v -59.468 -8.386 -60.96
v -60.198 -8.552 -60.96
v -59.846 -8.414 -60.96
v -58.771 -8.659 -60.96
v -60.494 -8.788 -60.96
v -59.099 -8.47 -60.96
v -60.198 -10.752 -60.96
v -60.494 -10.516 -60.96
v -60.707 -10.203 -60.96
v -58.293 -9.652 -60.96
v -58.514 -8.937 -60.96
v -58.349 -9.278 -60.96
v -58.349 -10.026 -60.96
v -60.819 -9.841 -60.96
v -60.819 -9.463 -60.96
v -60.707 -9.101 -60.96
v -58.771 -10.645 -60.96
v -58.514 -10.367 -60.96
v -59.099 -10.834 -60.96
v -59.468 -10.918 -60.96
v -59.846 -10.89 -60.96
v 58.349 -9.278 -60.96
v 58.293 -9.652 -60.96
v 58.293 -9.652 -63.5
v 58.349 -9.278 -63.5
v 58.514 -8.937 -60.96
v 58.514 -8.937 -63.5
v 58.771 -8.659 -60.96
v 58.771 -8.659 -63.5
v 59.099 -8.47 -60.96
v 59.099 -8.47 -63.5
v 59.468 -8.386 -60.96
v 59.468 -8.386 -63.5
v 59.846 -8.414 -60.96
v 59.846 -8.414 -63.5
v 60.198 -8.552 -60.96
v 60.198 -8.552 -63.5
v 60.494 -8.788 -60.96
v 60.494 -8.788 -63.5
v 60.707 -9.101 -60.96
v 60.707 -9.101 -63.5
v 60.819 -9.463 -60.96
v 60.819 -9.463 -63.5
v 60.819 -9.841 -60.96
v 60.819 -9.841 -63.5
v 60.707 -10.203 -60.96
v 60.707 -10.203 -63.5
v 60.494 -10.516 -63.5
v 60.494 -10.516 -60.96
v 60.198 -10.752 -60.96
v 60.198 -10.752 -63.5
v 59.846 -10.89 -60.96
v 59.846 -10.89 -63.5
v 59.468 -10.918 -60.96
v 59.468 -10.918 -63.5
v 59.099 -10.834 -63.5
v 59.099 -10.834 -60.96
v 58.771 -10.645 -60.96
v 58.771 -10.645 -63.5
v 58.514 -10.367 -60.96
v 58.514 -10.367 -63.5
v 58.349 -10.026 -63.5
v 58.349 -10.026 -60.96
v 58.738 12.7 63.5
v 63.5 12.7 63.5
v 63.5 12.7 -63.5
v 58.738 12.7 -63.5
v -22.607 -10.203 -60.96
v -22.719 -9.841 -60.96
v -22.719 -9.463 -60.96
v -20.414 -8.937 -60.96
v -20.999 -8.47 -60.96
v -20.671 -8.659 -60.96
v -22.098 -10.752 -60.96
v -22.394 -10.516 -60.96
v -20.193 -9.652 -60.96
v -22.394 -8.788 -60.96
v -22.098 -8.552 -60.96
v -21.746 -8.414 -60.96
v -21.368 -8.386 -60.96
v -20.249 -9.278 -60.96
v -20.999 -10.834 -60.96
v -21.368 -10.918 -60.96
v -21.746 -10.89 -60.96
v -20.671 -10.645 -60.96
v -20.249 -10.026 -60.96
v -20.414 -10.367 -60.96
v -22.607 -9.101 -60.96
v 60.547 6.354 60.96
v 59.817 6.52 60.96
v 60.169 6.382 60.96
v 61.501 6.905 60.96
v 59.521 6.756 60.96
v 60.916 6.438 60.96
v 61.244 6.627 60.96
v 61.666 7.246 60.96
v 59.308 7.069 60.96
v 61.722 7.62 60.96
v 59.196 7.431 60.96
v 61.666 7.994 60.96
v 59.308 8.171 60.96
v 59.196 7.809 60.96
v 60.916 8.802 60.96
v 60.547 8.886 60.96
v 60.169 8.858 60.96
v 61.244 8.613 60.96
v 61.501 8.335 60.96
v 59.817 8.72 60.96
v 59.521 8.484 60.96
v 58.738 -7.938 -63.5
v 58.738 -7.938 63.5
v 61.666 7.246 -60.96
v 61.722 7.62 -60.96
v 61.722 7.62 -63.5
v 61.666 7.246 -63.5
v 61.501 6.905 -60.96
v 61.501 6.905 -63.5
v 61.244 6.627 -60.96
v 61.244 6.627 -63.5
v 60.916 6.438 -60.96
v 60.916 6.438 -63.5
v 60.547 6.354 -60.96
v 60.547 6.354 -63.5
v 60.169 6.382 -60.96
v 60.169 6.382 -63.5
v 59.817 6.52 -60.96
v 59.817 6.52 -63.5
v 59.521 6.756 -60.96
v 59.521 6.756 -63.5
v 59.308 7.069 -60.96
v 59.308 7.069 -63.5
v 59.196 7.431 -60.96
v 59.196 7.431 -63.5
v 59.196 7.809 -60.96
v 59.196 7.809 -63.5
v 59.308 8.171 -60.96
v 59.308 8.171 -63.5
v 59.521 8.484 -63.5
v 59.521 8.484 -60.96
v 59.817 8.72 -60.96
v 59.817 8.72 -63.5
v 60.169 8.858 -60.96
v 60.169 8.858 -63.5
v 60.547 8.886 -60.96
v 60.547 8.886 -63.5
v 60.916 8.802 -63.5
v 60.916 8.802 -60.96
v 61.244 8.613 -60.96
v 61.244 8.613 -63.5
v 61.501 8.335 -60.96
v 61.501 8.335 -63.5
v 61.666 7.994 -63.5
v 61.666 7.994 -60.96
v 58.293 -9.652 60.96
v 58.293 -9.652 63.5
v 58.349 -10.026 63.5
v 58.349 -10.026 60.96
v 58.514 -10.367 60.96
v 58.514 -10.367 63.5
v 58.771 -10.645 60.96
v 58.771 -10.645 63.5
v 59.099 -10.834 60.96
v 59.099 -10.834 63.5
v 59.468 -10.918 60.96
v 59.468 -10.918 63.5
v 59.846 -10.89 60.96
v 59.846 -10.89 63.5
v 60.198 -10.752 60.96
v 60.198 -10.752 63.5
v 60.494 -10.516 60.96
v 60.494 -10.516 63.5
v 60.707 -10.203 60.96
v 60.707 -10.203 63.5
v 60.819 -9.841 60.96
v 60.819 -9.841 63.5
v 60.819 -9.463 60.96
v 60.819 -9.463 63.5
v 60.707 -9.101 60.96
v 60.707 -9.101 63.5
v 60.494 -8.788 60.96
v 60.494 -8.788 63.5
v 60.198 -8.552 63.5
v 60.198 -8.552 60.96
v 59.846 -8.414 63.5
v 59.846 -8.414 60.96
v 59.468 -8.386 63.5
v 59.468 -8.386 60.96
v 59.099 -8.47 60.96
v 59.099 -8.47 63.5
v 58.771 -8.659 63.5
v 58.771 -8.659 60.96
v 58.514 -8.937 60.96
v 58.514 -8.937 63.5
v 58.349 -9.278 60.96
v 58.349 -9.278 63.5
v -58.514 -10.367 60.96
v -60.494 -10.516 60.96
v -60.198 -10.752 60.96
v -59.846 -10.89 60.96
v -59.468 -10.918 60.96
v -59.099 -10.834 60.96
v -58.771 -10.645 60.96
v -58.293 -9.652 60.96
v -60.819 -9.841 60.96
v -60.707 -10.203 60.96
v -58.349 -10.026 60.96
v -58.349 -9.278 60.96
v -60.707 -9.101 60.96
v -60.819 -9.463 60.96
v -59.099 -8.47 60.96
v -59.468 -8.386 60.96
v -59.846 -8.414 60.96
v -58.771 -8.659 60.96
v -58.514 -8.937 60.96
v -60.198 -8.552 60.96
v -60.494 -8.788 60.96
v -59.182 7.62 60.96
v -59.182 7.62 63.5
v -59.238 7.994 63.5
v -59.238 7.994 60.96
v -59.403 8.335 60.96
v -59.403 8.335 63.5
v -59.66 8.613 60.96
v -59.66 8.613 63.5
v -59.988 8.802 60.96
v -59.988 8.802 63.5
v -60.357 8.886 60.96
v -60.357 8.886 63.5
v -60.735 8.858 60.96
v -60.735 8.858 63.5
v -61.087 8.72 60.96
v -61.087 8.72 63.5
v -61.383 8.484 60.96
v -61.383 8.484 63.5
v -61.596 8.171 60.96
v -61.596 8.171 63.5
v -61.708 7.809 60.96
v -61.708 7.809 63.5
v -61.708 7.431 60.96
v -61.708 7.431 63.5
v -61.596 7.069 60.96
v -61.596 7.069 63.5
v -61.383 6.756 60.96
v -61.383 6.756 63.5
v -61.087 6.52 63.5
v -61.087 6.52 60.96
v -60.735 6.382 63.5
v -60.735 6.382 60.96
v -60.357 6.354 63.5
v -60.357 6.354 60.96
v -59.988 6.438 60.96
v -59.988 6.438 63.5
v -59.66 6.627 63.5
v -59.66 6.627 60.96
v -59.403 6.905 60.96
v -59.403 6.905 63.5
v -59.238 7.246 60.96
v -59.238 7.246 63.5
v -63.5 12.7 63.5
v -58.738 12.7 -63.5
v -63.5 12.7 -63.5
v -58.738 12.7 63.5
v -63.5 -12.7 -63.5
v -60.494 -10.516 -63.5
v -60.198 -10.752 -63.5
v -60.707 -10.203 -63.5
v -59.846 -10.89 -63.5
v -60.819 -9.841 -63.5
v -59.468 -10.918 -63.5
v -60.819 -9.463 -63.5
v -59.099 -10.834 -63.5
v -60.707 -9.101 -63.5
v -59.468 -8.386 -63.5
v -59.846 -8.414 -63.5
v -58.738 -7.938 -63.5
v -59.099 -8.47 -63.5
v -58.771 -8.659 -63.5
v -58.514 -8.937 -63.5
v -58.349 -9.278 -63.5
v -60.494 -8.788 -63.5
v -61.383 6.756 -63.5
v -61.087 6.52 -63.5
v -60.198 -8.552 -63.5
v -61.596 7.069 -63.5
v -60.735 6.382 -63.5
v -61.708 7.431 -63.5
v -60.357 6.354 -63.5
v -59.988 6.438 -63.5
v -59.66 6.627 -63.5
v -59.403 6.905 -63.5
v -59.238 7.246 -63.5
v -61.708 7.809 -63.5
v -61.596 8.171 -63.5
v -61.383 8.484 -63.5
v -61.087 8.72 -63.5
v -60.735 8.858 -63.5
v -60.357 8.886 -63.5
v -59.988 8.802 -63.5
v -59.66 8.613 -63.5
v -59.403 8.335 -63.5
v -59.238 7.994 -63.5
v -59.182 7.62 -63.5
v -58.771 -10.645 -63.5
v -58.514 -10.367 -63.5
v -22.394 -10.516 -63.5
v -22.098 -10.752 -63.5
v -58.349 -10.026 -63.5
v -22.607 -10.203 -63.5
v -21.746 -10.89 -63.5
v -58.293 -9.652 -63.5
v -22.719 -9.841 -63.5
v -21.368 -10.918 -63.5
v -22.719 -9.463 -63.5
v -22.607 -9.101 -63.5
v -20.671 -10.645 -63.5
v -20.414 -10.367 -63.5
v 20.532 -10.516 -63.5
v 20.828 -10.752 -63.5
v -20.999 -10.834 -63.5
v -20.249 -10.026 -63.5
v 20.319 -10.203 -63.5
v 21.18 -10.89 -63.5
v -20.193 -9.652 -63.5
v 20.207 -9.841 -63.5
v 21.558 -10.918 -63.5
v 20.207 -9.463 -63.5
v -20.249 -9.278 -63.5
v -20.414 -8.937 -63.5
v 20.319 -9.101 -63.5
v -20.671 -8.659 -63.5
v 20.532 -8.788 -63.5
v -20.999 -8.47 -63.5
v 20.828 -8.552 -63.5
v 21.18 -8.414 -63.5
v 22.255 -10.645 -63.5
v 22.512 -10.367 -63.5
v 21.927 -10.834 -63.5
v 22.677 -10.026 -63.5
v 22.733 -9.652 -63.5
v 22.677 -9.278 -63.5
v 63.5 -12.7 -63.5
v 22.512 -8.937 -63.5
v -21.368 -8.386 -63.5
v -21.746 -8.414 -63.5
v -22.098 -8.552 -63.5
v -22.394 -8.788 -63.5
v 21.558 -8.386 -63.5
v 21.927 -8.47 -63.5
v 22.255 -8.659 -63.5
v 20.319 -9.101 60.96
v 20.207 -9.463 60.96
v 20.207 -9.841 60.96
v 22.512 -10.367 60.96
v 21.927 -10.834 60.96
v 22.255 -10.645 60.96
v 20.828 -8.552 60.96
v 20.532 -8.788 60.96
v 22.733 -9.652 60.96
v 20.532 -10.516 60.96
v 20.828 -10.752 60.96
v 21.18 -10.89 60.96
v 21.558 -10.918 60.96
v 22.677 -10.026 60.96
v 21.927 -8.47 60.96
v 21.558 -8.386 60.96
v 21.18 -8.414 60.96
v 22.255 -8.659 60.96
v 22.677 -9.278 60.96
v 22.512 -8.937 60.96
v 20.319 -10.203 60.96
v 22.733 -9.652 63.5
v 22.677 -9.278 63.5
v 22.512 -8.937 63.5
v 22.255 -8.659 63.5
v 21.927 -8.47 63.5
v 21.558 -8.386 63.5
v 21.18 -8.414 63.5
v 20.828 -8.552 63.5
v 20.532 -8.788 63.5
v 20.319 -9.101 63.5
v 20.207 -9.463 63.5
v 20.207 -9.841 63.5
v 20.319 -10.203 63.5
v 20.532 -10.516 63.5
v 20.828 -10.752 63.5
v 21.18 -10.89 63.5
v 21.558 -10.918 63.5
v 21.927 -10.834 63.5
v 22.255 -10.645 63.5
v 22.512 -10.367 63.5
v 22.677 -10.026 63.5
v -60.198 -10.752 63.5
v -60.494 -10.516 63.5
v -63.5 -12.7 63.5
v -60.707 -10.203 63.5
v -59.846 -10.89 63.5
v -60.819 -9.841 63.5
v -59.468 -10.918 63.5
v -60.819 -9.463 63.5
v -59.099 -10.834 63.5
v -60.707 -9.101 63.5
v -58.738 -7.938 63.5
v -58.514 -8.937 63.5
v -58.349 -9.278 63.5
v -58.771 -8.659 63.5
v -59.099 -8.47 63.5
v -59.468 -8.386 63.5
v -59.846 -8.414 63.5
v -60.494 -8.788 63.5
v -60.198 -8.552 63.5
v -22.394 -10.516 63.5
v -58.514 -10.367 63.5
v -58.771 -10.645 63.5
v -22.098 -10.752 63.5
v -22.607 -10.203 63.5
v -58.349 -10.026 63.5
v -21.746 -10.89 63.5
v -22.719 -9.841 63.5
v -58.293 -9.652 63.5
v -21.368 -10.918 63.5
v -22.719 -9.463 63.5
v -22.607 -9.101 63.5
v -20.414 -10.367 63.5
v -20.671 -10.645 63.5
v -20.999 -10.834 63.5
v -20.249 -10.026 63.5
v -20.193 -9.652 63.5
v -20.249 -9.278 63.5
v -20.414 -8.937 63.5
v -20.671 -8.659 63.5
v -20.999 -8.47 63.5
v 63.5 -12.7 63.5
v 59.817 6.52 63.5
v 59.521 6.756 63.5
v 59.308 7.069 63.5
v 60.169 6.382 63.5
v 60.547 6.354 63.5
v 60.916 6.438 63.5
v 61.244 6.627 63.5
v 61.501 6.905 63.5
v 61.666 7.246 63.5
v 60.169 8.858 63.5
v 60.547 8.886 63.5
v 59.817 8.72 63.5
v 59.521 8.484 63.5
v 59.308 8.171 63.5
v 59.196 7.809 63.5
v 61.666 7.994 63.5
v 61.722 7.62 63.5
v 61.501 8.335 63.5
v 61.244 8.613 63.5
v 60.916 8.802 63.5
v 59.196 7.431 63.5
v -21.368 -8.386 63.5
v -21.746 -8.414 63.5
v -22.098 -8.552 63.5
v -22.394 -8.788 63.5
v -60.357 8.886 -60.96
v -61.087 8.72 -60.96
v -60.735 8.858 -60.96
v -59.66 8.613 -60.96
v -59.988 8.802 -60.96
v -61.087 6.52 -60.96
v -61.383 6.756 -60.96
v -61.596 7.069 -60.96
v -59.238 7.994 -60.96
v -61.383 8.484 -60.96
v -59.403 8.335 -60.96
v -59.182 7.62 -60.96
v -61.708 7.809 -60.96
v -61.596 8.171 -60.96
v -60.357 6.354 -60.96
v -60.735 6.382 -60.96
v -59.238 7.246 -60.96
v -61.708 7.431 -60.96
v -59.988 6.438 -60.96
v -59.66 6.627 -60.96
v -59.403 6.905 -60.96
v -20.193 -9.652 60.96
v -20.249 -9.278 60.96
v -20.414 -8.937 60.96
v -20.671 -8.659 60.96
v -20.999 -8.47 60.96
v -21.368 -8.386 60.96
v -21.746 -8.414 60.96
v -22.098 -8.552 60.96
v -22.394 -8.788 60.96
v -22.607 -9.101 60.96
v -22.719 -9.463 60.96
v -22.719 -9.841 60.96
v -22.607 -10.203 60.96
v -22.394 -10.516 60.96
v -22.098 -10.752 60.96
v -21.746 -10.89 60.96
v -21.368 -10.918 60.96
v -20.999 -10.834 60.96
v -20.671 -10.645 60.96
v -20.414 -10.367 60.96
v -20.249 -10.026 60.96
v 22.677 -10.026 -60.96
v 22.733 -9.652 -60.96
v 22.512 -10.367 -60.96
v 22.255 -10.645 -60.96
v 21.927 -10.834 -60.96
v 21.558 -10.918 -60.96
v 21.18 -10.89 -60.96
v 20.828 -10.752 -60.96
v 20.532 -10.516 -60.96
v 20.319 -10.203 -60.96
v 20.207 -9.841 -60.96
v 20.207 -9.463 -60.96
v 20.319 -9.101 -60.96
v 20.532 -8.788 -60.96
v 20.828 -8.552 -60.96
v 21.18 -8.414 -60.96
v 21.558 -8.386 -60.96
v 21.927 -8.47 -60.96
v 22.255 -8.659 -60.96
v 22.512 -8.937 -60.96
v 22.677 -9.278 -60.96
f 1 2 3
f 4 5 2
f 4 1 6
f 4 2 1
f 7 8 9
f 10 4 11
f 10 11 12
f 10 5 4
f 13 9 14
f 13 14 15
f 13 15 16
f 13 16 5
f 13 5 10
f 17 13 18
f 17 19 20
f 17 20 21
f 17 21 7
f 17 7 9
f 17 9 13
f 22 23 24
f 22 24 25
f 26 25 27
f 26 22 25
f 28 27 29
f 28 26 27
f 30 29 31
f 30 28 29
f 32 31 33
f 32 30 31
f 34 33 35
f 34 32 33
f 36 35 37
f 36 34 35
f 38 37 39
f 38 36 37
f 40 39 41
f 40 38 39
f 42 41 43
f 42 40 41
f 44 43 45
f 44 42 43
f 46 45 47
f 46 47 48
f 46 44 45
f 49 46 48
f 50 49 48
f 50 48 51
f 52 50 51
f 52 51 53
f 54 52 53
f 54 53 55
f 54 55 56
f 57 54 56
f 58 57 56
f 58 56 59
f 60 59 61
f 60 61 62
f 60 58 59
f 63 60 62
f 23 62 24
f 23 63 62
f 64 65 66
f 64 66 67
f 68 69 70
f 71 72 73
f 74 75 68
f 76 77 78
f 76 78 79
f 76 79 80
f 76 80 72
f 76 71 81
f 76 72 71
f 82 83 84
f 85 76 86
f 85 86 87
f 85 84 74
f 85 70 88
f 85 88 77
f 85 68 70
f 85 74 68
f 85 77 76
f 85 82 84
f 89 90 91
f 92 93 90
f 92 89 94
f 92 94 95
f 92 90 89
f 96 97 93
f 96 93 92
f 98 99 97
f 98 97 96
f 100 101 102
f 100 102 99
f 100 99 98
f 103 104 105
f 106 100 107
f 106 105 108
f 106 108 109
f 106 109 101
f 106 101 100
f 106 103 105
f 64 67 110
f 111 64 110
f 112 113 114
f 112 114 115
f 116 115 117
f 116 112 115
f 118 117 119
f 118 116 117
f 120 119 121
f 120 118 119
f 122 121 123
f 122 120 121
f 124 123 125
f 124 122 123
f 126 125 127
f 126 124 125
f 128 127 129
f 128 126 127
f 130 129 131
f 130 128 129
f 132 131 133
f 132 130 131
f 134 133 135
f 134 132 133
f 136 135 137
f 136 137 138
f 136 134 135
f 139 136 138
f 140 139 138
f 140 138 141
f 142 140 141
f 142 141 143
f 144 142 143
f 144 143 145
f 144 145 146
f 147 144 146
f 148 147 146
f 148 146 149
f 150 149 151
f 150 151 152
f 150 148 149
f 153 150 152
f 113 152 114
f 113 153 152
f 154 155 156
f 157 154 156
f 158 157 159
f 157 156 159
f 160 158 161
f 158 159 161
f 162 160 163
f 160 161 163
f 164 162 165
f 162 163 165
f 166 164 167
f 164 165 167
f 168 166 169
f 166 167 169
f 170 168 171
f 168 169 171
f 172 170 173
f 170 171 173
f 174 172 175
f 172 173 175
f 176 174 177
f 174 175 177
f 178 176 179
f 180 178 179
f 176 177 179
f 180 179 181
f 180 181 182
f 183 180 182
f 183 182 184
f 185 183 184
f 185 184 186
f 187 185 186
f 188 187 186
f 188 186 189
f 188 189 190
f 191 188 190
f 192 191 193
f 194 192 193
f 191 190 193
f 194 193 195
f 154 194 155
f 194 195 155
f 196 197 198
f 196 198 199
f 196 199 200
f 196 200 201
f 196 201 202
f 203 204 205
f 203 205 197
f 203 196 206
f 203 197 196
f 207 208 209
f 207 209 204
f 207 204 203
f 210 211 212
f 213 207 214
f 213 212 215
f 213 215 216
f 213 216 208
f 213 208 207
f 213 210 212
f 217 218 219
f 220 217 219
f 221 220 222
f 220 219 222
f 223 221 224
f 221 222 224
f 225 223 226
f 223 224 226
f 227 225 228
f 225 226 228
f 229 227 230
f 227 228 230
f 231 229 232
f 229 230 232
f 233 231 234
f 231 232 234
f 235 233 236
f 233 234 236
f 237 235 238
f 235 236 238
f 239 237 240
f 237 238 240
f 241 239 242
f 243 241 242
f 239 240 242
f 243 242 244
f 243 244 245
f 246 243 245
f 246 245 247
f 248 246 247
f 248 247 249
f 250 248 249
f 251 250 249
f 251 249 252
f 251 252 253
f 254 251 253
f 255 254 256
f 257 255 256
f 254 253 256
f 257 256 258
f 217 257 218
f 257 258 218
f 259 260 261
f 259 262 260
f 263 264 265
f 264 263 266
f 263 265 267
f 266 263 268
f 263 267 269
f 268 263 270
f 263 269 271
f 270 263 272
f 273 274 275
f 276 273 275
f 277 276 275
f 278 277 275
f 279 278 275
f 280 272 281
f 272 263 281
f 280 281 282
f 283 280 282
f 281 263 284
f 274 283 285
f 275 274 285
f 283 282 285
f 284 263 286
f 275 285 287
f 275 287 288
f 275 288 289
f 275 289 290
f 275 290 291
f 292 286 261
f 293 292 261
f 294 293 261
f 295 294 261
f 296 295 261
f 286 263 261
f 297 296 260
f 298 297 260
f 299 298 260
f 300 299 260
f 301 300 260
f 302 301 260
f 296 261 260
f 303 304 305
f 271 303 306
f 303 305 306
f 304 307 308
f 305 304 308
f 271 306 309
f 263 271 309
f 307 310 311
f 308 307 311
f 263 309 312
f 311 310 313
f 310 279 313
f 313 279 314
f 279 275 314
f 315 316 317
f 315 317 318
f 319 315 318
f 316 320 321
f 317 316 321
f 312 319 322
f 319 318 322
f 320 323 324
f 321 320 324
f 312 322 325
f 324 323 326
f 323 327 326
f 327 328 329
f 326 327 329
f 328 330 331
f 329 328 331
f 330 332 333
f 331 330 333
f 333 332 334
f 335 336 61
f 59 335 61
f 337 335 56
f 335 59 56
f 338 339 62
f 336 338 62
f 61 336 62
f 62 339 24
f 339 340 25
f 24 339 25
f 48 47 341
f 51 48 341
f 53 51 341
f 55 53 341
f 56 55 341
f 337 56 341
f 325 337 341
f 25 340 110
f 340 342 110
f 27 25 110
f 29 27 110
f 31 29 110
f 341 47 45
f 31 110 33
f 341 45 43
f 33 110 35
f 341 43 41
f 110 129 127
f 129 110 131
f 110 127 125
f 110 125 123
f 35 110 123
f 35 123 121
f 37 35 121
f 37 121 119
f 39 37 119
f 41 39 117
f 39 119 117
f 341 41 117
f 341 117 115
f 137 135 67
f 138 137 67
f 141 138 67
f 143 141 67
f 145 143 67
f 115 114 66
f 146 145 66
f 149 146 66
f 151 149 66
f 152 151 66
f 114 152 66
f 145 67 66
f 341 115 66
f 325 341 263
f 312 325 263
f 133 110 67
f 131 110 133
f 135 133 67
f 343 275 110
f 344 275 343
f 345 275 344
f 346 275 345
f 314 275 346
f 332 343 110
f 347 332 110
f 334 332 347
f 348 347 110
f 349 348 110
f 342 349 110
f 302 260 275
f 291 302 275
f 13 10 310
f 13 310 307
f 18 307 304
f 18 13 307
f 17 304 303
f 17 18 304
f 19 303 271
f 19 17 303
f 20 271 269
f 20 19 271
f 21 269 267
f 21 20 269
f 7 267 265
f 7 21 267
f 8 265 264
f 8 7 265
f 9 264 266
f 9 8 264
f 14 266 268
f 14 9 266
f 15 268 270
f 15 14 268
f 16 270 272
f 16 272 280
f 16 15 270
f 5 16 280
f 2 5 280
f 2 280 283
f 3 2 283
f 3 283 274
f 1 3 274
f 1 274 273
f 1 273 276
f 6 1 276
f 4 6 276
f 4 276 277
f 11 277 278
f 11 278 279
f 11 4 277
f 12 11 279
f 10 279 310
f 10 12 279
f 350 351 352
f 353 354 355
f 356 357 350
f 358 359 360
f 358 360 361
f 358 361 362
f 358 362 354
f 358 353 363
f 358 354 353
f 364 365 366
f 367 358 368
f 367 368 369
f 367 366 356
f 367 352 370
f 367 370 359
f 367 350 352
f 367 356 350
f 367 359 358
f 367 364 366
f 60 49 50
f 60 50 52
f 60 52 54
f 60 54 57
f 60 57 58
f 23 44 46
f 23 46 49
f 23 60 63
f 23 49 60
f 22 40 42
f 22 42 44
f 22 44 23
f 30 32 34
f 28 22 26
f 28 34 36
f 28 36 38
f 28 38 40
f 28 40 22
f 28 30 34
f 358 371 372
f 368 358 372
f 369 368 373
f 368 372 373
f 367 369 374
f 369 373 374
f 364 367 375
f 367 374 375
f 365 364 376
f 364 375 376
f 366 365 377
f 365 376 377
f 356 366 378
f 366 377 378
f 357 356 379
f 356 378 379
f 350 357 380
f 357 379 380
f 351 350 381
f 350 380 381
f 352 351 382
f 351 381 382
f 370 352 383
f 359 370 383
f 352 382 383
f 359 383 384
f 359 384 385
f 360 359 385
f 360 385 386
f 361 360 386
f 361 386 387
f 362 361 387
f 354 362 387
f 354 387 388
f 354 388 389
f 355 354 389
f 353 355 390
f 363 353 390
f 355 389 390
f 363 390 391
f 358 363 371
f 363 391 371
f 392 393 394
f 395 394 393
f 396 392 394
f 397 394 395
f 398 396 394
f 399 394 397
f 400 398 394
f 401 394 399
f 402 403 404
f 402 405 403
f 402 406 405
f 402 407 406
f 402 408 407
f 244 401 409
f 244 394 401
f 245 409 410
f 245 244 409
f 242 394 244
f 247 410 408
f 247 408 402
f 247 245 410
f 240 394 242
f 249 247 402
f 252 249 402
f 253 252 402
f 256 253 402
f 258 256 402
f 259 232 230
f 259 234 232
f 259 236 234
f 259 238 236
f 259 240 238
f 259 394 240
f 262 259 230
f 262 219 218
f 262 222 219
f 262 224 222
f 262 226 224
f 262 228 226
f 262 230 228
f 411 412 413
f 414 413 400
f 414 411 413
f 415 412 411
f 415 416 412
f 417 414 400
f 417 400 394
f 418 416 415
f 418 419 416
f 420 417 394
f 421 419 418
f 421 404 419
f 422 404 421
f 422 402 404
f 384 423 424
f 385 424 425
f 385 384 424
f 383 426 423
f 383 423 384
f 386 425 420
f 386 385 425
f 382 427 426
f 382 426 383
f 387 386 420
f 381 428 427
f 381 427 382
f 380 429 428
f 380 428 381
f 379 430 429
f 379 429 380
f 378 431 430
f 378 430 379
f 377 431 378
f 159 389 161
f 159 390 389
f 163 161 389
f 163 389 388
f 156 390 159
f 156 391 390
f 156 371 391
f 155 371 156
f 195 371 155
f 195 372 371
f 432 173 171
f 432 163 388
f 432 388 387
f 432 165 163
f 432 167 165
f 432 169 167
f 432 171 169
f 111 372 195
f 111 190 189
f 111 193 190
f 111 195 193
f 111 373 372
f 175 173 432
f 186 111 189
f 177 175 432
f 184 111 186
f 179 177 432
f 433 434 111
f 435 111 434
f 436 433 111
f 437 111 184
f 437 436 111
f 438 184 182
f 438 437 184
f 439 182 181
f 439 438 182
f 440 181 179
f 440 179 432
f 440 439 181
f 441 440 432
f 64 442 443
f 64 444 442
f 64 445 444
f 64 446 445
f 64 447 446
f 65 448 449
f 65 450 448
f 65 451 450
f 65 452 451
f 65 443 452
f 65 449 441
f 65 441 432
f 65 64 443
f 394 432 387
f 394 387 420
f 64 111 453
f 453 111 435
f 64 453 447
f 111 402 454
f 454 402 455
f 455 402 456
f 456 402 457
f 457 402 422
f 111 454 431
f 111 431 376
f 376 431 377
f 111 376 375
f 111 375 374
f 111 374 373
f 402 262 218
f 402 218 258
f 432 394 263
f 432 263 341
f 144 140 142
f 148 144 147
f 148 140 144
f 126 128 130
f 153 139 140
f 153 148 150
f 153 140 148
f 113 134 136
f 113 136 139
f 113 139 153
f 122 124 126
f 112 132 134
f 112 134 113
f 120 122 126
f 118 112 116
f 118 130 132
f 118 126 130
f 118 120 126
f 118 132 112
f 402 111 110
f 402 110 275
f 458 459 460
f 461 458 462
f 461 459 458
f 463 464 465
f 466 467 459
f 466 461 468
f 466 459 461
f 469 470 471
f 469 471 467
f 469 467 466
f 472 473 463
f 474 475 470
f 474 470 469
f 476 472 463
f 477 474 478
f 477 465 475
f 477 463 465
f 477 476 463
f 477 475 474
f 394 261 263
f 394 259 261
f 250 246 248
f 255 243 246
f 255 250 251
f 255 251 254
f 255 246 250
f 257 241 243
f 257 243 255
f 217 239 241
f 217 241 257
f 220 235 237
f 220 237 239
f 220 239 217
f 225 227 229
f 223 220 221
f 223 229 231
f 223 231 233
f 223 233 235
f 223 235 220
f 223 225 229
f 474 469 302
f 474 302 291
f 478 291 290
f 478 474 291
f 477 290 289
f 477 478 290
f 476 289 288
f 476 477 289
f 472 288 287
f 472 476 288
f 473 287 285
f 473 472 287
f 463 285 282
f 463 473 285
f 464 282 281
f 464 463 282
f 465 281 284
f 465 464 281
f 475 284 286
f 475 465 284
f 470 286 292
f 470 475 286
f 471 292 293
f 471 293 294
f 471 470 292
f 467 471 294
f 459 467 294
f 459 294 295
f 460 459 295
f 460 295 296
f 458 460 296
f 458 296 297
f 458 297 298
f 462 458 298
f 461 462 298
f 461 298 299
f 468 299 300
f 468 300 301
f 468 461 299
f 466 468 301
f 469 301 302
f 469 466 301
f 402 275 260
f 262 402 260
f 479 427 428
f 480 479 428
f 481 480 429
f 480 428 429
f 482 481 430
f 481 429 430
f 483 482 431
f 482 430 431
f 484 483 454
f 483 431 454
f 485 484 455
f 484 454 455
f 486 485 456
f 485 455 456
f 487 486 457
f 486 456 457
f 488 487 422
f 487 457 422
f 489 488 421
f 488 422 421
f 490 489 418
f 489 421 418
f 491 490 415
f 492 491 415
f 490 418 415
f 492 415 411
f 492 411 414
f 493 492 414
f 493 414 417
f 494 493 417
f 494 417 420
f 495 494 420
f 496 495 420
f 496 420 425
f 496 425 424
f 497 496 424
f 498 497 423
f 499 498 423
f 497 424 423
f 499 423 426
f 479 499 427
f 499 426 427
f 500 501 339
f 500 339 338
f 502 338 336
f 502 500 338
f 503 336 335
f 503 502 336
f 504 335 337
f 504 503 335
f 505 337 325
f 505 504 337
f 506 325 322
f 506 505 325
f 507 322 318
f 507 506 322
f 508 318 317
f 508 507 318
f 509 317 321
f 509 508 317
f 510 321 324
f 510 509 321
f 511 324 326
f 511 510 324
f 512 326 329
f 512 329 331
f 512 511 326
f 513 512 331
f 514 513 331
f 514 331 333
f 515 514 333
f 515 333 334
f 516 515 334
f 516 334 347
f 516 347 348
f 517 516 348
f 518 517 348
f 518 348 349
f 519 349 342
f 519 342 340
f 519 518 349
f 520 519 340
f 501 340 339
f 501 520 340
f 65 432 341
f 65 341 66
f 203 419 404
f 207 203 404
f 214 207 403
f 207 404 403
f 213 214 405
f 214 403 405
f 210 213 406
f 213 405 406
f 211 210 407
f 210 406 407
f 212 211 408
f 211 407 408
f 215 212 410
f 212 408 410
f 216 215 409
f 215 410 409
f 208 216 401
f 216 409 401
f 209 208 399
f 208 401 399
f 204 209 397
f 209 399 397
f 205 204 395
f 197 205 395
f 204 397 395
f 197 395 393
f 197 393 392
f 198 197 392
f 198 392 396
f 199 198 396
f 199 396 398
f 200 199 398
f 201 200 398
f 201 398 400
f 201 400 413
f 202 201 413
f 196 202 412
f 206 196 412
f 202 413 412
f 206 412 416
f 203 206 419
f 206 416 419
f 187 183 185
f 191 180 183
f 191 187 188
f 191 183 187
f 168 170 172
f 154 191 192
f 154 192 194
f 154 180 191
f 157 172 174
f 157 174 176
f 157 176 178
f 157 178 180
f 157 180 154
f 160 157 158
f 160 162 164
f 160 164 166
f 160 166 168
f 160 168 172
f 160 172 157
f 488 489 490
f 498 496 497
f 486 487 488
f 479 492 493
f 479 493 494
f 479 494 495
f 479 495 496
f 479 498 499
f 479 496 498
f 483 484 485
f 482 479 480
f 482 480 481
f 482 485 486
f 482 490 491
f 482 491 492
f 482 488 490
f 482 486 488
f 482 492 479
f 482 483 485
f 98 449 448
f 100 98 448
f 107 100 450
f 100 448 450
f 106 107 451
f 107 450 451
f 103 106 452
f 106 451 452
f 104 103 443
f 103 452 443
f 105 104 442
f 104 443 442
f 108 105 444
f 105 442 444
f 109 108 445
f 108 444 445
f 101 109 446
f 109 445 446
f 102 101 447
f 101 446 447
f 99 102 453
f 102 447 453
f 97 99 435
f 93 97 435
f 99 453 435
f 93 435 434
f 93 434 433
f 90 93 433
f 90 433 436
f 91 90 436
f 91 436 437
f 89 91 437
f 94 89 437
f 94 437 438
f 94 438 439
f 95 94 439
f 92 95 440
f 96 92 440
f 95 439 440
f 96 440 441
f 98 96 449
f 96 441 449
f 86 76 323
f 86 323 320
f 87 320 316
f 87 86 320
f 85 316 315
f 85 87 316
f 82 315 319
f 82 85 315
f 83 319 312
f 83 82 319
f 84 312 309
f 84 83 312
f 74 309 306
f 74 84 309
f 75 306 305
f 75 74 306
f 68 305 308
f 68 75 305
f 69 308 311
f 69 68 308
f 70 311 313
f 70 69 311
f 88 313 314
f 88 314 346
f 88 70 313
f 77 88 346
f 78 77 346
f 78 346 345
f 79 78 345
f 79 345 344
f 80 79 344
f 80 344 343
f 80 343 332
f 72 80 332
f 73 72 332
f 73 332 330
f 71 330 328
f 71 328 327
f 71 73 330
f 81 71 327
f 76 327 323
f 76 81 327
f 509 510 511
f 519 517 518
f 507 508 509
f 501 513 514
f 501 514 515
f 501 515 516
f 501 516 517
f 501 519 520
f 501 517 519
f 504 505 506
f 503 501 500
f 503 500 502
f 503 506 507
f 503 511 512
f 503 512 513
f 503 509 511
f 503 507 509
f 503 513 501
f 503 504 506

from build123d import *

# Parameters (mm, degrees)
BOSS_EXTRUDE2_DEPTH = 63.5
SKETCH4_R           = 1.27
CUT_EXTRUDE1_DEPTH  = 2.54
CUT_EXTRUDE2_START  = -2.54
SKETCH5_R           = 1.27
CUT_EXTRUDE2_DEPTH  = 2.54


with BuildPart() as part:
    # Sketch3 → Boss-Extrude2 (new, symmetric)
    with BuildSketch(Plane.XY):
        Polygon((-63.5, 12.7), (-63.5, -12.7), (63.5, -12.7), (63.5, 12.7), (58.7375, 12.7), (58.7375, -7.9375), (-58.7375, -7.9375), (-58.7375, 12.7), align=None)
    extrude(amount=BOSS_EXTRUDE2_DEPTH, both=True)

    # Sketch4 → Cut-Extrude1 (cut)
    with BuildSketch(Plane.XY.offset(63.5)):
        with Locations((-60.452, 7.62)):
            Circle(SKETCH4_R)
        with Locations(Location((59.563, -9.652, 0), (0, 0, 180))):
            Circle(SKETCH4_R)
        with Locations((60.452, 7.62)):
            Circle(SKETCH4_R)
        with Locations((-21.463, -9.652)):
            Circle(SKETCH4_R)
        with Locations((21.463, -9.652)):
            Circle(SKETCH4_R)
        with Locations((-59.563, -9.652)):
            Circle(SKETCH4_R)
    extrude(amount=-CUT_EXTRUDE1_DEPTH, mode=Mode.SUBTRACT)

    # Sketch5 → Cut-Extrude2 (cut)
    with BuildSketch(Plane(origin=(0, 0, -63.5), x_dir=(-1, 0, 0), z_dir=(0, 0, -1)).offset(CUT_EXTRUDE2_START)):
        with Locations((-59.563, -9.652)):
            Circle(SKETCH5_R)
        with Locations(Location((-60.452, 7.62, 0), (0, 0, 180))):
            Circle(SKETCH5_R)
        with Locations(Location((-21.463, -9.652, 0), (0, 0, 180))):
            Circle(SKETCH5_R)
        with Locations(Location((21.463, -9.652, 0), (0, 0, 180))):
            Circle(SKETCH5_R)
        with Locations(Location((60.452, 7.62, 0), (0, 0, 180))):
            Circle(SKETCH5_R)
        with Locations(Location((59.563, -9.652, 0), (0, 0, 180))):
            Circle(SKETCH5_R)
    extrude(amount=CUT_EXTRUDE2_DEPTH, mode=Mode.SUBTRACT)


solid = part.part
